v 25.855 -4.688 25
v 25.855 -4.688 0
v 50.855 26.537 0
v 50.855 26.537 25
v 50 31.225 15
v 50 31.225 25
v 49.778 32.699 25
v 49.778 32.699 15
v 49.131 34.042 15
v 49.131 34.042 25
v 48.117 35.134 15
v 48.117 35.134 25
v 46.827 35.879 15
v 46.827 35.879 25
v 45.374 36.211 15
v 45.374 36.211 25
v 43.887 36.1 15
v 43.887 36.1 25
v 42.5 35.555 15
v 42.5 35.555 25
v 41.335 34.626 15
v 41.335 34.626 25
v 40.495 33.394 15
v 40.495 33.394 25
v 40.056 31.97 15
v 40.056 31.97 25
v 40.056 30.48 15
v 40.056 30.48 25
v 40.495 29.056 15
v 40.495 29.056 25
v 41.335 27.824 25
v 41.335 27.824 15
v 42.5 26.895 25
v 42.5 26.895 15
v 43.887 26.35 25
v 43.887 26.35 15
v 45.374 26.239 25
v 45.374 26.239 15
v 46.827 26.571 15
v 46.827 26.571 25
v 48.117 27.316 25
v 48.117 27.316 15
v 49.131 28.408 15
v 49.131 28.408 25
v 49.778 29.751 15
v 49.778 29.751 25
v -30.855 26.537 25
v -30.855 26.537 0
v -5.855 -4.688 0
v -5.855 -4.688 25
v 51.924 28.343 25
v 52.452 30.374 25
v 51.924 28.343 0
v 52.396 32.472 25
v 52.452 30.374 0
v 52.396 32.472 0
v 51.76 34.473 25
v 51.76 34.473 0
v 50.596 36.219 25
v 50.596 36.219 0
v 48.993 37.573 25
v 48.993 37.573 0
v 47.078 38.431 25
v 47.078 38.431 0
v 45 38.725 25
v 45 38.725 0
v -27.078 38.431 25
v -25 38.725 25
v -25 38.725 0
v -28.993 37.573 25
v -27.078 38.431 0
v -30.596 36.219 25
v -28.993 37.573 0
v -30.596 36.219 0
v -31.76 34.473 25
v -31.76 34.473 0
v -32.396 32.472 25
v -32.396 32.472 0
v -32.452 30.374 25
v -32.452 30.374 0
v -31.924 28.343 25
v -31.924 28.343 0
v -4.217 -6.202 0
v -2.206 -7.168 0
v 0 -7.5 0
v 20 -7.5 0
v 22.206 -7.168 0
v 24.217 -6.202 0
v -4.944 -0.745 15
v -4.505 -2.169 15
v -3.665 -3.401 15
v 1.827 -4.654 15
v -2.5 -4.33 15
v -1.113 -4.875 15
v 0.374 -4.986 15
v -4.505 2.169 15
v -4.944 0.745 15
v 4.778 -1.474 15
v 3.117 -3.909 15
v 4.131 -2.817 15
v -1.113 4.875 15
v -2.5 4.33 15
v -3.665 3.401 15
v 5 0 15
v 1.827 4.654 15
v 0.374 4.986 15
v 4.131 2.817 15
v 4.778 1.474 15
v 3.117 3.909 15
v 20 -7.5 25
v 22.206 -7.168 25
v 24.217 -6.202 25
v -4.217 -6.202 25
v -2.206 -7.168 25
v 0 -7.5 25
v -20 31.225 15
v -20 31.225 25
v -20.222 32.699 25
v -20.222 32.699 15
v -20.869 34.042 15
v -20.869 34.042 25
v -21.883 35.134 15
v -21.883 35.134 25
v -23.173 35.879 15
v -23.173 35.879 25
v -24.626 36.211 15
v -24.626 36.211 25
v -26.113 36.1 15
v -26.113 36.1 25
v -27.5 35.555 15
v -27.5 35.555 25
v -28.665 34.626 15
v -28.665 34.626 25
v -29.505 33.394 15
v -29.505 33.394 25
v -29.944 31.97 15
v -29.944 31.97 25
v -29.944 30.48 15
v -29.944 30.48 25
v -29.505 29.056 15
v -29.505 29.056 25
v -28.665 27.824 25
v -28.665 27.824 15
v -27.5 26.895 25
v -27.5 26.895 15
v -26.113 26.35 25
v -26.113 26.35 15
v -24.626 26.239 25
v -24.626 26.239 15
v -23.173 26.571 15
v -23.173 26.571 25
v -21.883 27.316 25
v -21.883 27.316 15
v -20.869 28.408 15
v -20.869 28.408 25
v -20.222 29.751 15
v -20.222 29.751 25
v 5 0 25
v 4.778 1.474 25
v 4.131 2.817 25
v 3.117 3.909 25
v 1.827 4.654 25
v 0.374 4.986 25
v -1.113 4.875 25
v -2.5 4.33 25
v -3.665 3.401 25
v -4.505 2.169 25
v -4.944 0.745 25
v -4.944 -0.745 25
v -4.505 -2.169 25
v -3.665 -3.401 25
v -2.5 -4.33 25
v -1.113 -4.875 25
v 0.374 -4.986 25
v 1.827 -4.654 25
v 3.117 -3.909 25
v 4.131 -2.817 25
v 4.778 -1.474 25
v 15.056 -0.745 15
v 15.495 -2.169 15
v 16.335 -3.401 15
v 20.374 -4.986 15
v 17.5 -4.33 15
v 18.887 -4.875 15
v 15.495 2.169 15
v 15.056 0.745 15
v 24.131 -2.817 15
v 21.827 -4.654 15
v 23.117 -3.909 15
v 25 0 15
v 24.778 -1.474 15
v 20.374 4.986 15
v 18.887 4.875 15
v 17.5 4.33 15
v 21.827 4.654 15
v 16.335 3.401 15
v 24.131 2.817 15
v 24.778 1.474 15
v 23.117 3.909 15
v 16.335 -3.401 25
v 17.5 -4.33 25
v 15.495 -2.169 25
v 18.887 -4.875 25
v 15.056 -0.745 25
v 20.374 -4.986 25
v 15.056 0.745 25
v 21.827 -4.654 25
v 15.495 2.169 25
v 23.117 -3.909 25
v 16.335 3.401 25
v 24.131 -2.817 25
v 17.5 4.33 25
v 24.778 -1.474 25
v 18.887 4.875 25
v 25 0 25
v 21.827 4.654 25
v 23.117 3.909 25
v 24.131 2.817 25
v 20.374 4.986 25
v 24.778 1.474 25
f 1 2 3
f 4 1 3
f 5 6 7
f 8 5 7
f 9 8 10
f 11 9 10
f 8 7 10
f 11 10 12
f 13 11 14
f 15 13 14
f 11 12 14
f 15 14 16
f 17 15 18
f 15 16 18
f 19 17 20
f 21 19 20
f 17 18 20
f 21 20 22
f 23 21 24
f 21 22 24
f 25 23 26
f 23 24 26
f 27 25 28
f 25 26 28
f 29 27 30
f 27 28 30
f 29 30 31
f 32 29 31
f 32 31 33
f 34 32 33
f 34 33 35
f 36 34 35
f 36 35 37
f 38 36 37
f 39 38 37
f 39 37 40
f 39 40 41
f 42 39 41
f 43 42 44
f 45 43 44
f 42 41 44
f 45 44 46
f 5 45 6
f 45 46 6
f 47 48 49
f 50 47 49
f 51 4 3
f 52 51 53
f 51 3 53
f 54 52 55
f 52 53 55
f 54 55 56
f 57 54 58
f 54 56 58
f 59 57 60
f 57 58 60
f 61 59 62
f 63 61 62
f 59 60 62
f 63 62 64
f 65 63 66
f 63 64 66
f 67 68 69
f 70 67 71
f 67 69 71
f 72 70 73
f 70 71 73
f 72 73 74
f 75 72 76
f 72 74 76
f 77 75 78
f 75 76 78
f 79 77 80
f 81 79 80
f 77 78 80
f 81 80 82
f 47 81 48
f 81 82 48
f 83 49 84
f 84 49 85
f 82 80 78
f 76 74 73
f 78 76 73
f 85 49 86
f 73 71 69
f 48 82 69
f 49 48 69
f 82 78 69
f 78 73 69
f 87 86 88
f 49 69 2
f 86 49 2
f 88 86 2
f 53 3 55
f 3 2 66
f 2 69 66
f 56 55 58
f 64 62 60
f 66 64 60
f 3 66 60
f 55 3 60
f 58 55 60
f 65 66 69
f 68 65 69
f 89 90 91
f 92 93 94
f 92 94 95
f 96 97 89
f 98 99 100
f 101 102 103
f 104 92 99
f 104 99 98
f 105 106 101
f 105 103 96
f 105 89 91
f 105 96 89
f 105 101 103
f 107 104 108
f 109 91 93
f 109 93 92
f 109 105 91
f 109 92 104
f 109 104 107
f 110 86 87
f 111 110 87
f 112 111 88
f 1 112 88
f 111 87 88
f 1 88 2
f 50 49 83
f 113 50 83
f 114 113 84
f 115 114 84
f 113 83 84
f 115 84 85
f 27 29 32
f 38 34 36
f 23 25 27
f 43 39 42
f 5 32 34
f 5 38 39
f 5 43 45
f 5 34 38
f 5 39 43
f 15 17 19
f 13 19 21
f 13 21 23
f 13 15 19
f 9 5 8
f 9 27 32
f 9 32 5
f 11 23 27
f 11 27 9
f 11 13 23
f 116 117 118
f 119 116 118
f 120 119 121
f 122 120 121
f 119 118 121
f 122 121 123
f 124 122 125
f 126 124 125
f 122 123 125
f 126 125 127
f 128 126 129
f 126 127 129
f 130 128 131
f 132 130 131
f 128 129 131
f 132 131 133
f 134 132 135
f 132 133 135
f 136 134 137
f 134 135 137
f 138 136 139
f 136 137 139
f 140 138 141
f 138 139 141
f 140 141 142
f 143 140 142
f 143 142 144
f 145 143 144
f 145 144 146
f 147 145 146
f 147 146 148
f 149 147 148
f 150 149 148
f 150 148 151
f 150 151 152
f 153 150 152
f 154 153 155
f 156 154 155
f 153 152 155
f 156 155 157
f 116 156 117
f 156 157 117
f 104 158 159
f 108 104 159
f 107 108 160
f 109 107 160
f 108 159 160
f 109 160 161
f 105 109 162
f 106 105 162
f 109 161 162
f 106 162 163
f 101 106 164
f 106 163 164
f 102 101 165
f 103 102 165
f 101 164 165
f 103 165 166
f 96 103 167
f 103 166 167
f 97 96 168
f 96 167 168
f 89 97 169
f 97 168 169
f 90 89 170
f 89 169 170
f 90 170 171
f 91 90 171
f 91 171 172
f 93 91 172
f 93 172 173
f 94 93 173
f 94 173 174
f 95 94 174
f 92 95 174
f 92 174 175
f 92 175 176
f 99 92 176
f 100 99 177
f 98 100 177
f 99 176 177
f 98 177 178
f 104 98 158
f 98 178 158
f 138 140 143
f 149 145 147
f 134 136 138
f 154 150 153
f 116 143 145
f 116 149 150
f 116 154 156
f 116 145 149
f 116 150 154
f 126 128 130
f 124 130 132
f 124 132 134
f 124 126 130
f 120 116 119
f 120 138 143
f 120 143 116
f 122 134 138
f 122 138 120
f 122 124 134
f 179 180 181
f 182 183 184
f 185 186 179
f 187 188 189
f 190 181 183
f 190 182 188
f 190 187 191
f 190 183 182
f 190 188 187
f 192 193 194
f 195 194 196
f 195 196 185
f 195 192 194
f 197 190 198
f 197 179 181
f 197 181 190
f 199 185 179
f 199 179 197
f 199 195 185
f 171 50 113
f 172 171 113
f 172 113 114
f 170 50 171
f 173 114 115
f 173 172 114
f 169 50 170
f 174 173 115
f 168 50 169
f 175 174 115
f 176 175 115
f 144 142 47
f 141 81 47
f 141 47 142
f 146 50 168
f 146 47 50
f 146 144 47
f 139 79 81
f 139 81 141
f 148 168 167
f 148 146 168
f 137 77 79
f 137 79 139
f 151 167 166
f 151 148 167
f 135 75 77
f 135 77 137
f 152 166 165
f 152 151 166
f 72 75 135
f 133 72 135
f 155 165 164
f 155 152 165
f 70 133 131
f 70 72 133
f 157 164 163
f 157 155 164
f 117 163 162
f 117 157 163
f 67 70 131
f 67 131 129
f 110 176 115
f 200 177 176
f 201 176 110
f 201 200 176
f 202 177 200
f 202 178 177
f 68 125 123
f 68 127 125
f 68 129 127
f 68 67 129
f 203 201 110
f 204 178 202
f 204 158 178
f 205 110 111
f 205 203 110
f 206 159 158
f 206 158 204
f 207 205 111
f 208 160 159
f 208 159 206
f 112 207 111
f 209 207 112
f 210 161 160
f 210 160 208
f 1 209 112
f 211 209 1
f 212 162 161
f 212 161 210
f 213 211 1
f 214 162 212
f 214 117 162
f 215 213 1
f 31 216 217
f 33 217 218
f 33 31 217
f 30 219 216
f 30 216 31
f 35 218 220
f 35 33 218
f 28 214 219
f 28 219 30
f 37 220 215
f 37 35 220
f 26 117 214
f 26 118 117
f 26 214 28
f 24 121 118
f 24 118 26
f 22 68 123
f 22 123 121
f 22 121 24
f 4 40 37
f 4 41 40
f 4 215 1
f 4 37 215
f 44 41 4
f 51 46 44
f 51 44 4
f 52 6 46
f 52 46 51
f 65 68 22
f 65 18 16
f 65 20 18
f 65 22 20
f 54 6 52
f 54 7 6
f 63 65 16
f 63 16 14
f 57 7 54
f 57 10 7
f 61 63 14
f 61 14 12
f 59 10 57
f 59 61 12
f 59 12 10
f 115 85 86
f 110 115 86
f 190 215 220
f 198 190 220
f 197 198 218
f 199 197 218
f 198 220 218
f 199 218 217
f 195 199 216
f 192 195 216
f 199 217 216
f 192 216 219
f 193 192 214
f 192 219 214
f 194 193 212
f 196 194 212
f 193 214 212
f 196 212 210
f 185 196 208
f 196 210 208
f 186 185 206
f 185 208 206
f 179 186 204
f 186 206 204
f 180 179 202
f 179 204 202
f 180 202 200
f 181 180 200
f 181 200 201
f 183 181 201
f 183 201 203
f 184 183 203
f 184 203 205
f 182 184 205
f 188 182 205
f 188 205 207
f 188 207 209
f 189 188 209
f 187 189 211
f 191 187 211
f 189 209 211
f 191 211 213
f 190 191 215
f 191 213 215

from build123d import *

# Parameters (mm, degrees)
EXTRUDE_1_DEPTH     = 25
SKETCH_2_R          = 5
CUT_EXTRUDE_1_DEPTH = 10


with BuildPart() as part:
    # 草图1 → 凸台-拉伸1 (new body)
    with BuildSketch(Plane.XY):
        with BuildLine():
            Line((0, -7.5), (20, -7.5))
            ThreePointArc((20, -7.5), (23.247595264, -6.760408641), (25.854685623, -4.6875))
            Line((25.854685623, -4.6875), (50.854685623, 26.537489992))
            ThreePointArc((50.854685623, 26.537489992), (51.760408641, 34.472585256), (45, 38.724989992))
            Line((45, 38.724989992), (-25, 38.724989992))
            ThreePointArc((-25, 38.724989992), (-31.760408641, 34.472585256), (-30.854685623, 26.537489992))
            Line((-30.854685623, 26.537489992), (-5.854685623, -4.6875))
            ThreePointArc((-5.854685623, -4.6875), (-3.247595264, -6.760408641), (0, -7.5))
        make_face()
    extrude(amount=EXTRUDE_1_DEPTH)

    # 草图2 → 切除-拉伸1 (cut)
    with BuildSketch(Plane.XY.offset(25)):
        with Locations((-25, 31.224989992)):
            Circle(SKETCH_2_R)
        Circle(SKETCH_2_R)
        with Locations((20, 0)):
            Circle(SKETCH_2_R)
        with Locations((45, 31.224989992)):
            Circle(SKETCH_2_R)
    extrude(amount=-CUT_EXTRUDE_1_DEPTH, mode=Mode.SUBTRACT)


solid = part.part
